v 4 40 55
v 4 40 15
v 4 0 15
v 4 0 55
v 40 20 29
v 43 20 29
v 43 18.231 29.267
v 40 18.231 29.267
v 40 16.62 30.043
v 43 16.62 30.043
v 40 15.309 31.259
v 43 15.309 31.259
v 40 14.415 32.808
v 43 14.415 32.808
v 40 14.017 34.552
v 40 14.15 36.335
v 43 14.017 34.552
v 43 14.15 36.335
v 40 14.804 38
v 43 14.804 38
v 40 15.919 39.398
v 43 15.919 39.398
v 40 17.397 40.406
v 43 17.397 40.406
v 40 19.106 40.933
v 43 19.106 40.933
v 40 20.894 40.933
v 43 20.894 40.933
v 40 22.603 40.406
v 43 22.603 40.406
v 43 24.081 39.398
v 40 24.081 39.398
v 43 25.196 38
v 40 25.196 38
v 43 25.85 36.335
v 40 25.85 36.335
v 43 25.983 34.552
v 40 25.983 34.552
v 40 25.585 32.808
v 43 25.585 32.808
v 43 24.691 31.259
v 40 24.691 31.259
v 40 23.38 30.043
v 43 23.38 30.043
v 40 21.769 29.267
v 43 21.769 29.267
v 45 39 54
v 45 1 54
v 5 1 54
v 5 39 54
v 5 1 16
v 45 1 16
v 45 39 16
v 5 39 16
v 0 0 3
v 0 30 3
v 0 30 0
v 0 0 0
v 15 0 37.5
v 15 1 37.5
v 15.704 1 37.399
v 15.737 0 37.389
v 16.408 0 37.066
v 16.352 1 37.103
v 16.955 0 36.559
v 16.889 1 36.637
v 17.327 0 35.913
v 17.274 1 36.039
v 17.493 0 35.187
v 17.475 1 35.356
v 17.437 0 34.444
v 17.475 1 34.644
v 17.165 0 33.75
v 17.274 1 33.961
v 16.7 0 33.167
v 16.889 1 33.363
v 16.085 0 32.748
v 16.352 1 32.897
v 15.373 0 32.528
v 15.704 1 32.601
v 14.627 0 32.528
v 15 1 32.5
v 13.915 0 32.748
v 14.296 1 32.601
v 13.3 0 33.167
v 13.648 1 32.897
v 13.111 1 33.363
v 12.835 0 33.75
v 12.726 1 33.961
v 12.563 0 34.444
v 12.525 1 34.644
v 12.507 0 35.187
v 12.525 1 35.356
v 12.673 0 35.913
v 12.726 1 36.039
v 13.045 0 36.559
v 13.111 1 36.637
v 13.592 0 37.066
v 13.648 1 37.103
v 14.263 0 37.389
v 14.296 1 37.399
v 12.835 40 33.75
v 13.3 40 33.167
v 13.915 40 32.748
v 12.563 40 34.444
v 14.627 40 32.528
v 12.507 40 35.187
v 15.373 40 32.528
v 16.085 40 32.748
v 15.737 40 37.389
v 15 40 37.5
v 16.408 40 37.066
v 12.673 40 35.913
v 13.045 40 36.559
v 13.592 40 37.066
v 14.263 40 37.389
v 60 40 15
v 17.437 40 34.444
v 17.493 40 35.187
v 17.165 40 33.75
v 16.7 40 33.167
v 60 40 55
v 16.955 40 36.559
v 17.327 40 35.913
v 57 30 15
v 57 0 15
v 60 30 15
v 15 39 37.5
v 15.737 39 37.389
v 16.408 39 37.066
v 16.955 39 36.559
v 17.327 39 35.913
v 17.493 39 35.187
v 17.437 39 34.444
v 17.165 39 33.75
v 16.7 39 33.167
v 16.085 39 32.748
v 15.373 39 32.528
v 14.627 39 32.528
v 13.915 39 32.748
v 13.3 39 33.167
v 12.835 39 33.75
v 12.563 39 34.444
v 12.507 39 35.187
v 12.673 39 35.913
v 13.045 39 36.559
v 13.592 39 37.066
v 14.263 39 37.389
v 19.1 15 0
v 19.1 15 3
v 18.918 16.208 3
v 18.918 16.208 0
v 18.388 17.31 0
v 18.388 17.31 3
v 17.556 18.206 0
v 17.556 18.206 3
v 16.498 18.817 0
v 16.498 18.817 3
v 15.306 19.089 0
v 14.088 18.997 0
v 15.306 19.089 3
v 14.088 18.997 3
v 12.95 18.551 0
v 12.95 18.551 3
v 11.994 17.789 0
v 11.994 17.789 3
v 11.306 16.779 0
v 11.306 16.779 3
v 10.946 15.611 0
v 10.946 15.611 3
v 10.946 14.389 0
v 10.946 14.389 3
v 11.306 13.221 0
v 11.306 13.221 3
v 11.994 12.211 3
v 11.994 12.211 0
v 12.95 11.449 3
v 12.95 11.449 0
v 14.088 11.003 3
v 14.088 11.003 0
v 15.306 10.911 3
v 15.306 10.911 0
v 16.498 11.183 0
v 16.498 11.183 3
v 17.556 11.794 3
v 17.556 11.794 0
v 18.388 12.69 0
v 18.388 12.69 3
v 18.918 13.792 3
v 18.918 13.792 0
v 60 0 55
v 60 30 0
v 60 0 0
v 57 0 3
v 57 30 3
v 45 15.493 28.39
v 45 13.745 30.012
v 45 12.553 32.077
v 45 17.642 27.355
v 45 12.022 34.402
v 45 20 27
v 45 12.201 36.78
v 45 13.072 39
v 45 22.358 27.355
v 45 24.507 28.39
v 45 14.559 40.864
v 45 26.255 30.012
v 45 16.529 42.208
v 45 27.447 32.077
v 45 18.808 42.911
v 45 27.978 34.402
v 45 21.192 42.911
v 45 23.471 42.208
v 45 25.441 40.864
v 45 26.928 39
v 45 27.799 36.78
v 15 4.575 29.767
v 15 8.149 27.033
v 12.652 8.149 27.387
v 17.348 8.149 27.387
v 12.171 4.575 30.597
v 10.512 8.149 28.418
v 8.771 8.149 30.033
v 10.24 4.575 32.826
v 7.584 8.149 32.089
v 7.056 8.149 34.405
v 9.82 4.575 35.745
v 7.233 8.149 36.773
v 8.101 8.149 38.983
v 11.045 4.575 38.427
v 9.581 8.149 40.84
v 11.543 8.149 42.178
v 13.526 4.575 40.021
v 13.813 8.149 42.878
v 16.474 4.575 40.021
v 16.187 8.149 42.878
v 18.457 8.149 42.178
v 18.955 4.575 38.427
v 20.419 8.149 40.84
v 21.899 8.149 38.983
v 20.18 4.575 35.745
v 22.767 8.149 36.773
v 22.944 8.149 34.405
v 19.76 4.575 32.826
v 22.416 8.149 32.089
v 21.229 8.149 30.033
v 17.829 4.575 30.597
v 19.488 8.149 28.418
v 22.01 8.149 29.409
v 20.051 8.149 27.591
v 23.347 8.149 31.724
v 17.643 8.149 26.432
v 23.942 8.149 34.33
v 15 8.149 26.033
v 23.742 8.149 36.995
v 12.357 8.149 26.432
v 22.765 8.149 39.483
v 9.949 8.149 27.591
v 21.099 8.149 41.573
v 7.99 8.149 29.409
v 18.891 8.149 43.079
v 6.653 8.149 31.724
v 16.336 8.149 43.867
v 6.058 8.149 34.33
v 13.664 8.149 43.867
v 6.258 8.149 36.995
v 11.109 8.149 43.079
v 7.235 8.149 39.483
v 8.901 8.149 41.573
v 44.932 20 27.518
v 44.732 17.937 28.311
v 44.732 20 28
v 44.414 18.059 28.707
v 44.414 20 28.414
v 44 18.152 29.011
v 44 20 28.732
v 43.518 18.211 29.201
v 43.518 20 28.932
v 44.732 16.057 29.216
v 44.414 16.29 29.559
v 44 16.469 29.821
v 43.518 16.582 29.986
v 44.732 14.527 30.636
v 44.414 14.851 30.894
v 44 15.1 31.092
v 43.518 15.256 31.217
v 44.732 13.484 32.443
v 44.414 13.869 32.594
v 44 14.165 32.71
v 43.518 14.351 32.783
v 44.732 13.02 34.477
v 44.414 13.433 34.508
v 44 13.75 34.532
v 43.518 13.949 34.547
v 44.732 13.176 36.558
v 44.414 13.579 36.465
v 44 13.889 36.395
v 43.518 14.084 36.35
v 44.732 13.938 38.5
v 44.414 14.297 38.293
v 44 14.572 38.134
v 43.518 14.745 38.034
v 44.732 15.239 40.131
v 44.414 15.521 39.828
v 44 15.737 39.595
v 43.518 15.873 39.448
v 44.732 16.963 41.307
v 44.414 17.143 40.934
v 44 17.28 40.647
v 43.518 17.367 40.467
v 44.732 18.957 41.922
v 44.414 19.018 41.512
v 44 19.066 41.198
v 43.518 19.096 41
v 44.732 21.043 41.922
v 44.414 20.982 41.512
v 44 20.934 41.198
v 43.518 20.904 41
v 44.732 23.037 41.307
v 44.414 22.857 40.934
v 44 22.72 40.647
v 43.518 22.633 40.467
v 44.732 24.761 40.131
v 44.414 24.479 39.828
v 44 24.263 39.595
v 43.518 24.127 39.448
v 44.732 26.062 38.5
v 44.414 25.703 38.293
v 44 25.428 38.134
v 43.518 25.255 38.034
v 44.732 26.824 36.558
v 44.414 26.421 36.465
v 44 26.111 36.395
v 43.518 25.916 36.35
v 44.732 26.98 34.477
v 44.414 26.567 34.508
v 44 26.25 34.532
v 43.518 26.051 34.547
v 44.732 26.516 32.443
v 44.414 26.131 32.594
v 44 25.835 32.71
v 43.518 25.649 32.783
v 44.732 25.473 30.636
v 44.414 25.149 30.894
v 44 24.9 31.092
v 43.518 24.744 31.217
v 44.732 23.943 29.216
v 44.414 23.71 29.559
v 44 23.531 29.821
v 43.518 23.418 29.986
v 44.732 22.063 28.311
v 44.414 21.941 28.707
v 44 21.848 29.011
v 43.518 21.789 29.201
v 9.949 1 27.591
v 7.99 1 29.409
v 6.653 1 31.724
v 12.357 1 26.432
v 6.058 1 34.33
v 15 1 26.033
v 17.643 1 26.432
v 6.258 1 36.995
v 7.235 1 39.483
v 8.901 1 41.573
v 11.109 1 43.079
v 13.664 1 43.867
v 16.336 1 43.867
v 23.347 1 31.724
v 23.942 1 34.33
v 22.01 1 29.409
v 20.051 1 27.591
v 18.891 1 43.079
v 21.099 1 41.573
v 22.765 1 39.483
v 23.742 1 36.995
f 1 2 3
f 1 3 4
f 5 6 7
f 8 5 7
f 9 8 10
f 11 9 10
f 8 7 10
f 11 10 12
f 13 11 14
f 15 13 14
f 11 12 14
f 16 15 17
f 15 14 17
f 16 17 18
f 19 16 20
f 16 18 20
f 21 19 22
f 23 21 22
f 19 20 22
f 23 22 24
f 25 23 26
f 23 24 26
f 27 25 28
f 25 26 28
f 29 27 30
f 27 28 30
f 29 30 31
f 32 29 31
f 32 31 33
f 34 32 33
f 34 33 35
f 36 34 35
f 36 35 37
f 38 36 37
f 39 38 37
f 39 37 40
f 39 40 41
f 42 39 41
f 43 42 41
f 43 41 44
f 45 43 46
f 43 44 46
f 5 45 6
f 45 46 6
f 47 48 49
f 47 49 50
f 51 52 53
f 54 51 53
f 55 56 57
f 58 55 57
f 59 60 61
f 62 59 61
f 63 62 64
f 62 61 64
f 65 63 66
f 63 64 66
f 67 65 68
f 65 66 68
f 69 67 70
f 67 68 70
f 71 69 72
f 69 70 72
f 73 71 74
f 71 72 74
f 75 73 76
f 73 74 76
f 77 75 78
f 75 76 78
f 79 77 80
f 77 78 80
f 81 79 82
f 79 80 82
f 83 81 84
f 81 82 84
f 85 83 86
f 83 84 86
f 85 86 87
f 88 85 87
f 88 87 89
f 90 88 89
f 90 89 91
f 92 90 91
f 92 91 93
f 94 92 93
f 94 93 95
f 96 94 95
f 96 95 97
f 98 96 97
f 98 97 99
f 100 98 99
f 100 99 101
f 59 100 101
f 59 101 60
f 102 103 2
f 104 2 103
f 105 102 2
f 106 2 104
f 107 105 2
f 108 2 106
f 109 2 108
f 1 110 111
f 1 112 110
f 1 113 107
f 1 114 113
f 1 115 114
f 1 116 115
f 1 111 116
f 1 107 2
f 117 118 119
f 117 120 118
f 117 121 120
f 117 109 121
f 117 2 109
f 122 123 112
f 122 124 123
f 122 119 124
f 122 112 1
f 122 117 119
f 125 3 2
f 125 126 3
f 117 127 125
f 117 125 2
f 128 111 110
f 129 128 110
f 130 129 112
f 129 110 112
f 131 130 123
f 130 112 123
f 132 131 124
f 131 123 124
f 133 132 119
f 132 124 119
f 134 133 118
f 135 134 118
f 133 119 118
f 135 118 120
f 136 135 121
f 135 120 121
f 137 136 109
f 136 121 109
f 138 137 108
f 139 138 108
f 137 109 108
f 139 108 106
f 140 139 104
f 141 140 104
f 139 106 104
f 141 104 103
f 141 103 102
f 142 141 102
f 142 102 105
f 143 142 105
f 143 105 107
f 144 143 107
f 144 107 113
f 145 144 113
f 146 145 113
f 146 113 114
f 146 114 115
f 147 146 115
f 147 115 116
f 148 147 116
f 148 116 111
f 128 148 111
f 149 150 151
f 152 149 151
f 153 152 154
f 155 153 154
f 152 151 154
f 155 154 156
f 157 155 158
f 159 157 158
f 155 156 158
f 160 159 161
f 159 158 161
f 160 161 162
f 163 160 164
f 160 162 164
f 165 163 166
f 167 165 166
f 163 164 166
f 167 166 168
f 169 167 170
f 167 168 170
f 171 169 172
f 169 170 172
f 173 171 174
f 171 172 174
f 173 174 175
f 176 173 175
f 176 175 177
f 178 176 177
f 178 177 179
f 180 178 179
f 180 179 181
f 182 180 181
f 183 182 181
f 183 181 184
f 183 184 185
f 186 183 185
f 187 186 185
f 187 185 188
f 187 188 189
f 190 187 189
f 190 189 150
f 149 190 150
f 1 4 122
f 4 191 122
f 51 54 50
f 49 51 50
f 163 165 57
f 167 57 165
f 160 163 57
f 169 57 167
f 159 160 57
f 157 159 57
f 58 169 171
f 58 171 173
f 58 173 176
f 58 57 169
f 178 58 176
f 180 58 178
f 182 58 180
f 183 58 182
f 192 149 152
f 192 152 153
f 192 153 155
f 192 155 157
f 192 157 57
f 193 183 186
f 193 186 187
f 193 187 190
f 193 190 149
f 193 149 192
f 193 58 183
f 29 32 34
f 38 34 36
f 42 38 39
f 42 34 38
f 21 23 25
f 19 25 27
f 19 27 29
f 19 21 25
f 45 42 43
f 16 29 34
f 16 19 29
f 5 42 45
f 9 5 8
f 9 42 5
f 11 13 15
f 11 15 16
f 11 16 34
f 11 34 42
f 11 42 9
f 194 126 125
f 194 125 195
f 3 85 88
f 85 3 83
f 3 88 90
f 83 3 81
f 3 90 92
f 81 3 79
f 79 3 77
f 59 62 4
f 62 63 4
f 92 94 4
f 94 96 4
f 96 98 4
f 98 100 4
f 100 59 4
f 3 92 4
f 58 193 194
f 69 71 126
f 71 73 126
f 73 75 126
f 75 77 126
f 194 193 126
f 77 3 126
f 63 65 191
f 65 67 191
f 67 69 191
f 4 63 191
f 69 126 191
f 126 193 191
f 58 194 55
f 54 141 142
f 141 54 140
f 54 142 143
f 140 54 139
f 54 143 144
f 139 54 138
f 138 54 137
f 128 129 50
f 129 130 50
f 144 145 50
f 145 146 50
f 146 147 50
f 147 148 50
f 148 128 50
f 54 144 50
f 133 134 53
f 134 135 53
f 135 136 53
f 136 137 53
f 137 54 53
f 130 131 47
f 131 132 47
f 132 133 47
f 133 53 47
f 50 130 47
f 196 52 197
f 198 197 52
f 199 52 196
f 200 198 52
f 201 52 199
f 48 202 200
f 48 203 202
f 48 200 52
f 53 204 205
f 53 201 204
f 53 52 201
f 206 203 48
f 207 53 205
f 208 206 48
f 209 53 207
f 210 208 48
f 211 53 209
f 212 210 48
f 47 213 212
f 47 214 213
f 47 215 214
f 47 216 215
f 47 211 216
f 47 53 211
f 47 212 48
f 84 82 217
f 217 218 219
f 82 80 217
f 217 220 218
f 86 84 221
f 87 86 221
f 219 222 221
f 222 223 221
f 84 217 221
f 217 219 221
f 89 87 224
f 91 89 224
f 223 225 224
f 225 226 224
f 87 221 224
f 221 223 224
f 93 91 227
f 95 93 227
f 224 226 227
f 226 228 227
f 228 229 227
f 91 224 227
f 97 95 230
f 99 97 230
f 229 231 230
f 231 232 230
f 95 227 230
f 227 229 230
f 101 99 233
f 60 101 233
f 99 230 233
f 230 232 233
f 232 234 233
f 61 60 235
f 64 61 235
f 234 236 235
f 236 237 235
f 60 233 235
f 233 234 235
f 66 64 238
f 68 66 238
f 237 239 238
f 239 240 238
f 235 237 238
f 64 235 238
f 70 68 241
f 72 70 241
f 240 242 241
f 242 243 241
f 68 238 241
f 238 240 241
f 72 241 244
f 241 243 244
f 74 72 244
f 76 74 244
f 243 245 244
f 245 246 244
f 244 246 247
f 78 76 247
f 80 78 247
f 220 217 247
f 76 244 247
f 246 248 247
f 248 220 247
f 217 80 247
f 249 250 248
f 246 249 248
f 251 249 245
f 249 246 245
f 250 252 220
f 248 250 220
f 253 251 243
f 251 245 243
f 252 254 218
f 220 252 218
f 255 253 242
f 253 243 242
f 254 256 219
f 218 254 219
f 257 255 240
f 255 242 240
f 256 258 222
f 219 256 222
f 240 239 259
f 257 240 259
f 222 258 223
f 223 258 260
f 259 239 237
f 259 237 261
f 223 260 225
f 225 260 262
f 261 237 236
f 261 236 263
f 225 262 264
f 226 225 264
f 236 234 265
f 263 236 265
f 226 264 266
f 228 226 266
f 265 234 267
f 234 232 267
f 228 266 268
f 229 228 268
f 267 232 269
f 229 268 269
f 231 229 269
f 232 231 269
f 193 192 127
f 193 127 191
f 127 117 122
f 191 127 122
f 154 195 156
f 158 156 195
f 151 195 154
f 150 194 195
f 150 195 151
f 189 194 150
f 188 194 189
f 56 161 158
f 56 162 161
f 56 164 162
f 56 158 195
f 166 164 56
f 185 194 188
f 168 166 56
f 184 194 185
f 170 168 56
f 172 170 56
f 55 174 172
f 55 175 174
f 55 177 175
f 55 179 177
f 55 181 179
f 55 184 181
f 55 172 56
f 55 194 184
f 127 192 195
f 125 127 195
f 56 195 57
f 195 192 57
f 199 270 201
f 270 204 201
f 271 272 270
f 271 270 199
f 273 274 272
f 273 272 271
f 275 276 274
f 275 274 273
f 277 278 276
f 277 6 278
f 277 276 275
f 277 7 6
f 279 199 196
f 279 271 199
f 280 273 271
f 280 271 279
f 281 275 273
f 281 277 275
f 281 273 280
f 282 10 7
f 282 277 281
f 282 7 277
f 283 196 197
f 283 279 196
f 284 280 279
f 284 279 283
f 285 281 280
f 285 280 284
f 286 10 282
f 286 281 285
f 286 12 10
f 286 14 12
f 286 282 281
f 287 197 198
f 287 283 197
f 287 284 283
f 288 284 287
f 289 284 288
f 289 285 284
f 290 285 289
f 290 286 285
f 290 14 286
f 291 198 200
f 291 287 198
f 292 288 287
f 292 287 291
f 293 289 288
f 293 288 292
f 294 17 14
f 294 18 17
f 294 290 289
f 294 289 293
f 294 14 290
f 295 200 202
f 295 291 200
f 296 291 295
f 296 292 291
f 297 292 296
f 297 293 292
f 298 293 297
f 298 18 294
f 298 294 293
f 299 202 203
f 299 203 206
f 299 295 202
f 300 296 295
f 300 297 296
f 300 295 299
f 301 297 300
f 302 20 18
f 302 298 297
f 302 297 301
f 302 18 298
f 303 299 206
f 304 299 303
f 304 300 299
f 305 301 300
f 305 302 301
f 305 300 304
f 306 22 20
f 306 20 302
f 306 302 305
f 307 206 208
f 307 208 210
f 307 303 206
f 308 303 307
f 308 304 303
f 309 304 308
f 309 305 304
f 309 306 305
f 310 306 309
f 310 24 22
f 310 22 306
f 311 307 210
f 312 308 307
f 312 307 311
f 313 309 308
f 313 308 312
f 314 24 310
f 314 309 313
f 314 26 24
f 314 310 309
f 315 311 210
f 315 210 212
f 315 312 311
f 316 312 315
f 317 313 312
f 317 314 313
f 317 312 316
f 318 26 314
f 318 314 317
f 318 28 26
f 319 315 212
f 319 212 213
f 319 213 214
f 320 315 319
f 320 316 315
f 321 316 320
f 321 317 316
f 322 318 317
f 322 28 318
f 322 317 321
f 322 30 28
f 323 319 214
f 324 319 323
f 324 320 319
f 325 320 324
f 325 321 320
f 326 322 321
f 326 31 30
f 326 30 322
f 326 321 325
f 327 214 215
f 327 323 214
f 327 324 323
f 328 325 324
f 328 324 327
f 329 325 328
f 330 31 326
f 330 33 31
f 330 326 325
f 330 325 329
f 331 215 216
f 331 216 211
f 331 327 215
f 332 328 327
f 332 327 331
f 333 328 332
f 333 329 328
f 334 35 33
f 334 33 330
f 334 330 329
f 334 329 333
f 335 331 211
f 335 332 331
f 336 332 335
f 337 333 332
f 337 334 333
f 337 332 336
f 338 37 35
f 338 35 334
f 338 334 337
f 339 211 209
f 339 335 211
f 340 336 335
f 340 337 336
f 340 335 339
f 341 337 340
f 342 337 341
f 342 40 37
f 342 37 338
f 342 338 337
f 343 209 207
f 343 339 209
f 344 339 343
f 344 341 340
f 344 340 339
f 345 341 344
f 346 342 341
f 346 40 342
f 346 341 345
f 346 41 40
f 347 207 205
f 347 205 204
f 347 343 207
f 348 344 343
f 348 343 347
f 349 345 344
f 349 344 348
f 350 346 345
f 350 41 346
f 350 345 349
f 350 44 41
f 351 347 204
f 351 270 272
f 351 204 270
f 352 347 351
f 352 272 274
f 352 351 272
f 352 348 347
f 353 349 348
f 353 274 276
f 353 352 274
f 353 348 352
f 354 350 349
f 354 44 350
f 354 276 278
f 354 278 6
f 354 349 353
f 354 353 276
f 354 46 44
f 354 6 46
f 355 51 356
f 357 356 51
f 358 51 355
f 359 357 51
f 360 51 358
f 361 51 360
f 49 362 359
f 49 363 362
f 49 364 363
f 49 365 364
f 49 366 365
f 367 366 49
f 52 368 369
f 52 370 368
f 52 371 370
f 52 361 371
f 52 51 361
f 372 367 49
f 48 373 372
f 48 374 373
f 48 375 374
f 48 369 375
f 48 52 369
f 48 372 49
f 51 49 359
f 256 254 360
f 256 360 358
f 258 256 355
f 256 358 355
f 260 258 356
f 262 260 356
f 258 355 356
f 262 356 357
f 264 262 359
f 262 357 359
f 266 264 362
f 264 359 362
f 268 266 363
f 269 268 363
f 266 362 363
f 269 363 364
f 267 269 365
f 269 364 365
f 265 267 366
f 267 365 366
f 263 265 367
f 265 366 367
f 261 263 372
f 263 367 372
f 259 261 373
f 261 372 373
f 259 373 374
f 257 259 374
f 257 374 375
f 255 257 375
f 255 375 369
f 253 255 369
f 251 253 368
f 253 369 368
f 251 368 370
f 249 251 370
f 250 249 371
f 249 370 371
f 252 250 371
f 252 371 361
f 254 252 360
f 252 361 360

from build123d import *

# Parameters (mm, degrees)
EXTRUDE_THIN1_DEPTH = 30
SKETCH2_R           = 4.1
CUT_EXTRUDE1_DEPTH  = 10
BOSS_EXTRUDE1_START = -3
SKETCH3_W           = 40
SKETCH3_H           = 40
BOSS_EXTRUDE1_DEPTH = 15
SKETCH4_R           = 6
BOSS_EXTRUDE2_DEPTH = 5
FILLET1_R           = 2
SKETCH5_W           = 40
SKETCH5_H           = 40
SKETCH5_W_2         = 38
SKETCH5_H_2         = 38
BOSS_EXTRUDE3_DEPTH = 40
SKETCH6_W           = 40
SKETCH6_H           = 40
BOSS_EXTRUDE4_DEPTH = 1
SKETCH7_R           = 2.5
CUT_EXTRUDE2_DEPTH  = 91.691785736


with BuildPart() as part:
    # Sketch1 → Extrude-Thin1 (new body)
    with BuildSketch(Plane(origin=(0, 0, 0), x_dir=(1, 0, 0), z_dir=(0, 1, 0))):
        Polygon((0, 0), (60, 0), (60, -15), (57, -15), (57, -3), (0, -3), align=None)
    extrude(amount=EXTRUDE_THIN1_DEPTH)

    # Sketch2 → Cut-Extrude1 (cut)
    with BuildSketch(Plane.XY.offset(3)):
        with Locations((15, 15)):
            Circle(SKETCH2_R)
    extrude(amount=-CUT_EXTRUDE1_DEPTH, mode=Mode.SUBTRACT)

    # Sketch3 → Boss-Extrude1 (add)
    with BuildSketch(Plane.ZY.offset(-57).offset(BOSS_EXTRUDE1_START)):
        with Locations((35, 20)):
            Rectangle(SKETCH3_W, SKETCH3_H)
    extrude(amount=BOSS_EXTRUDE1_DEPTH)

    # Sketch4 → Boss-Extrude2 (add)
    with BuildSketch(Plane.ZY.offset(-45)):
        with Locations(Location((35, 20, 0), (0, 0, 180))):
            Circle(SKETCH4_R)
    extrude(amount=BOSS_EXTRUDE2_DEPTH)

    # Fillet1
    fillet1_edges = [part.edges().sort_by_distance(p)[0] for p in [
        (45, 20, 41),
    ]]
    fillet(fillet1_edges, radius=FILLET1_R)

    # Sketch5 → Boss-Extrude3 (add)
    with BuildSketch(Plane.ZY.offset(-45)):
        with Locations((35, 20)):
            Rectangle(SKETCH5_W, SKETCH5_H)
        with Locations((35, 20)):
            Rectangle(SKETCH5_W_2, SKETCH5_H_2, mode=Mode.SUBTRACT)
    extrude(amount=BOSS_EXTRUDE3_DEPTH)

    # Sketch6 → Boss-Extrude4 (add)
    with BuildSketch(Plane.ZY.offset(-5)):
        with Locations((35, 20)):
            Rectangle(SKETCH6_W, SKETCH6_H)
    extrude(amount=BOSS_EXTRUDE4_DEPTH)

    # Sketch7 → Cut-Extrude2 (cut, through all)
    with BuildSketch(Plane(origin=(0, 40, 0), x_dir=(1, 0, 0), z_dir=(0, 1, 0))):
        with Locations(Location((15, -35, 0), (0, 0, 270))):
            Circle(SKETCH7_R)
    extrude(amount=-CUT_EXTRUDE2_DEPTH, mode=Mode.SUBTRACT)

    # Sketch8 → Revolve1 (revolve)
    with BuildSketch(Plane.XY.offset(35), mode=Mode.PRIVATE) as revolve1_sk:
        Polygon((17.5, 1), (22.966741001, 8.14945752), (23.966741001, 8.14945752), (23.966741001, 1), align=None)
    revolve(revolve1_sk.sketch.rotate(Axis((15, 1, 35), (0, 1, 0)), 90), axis=Axis((15, 1, 35), (0, 1, 0)))


solid = part.part
